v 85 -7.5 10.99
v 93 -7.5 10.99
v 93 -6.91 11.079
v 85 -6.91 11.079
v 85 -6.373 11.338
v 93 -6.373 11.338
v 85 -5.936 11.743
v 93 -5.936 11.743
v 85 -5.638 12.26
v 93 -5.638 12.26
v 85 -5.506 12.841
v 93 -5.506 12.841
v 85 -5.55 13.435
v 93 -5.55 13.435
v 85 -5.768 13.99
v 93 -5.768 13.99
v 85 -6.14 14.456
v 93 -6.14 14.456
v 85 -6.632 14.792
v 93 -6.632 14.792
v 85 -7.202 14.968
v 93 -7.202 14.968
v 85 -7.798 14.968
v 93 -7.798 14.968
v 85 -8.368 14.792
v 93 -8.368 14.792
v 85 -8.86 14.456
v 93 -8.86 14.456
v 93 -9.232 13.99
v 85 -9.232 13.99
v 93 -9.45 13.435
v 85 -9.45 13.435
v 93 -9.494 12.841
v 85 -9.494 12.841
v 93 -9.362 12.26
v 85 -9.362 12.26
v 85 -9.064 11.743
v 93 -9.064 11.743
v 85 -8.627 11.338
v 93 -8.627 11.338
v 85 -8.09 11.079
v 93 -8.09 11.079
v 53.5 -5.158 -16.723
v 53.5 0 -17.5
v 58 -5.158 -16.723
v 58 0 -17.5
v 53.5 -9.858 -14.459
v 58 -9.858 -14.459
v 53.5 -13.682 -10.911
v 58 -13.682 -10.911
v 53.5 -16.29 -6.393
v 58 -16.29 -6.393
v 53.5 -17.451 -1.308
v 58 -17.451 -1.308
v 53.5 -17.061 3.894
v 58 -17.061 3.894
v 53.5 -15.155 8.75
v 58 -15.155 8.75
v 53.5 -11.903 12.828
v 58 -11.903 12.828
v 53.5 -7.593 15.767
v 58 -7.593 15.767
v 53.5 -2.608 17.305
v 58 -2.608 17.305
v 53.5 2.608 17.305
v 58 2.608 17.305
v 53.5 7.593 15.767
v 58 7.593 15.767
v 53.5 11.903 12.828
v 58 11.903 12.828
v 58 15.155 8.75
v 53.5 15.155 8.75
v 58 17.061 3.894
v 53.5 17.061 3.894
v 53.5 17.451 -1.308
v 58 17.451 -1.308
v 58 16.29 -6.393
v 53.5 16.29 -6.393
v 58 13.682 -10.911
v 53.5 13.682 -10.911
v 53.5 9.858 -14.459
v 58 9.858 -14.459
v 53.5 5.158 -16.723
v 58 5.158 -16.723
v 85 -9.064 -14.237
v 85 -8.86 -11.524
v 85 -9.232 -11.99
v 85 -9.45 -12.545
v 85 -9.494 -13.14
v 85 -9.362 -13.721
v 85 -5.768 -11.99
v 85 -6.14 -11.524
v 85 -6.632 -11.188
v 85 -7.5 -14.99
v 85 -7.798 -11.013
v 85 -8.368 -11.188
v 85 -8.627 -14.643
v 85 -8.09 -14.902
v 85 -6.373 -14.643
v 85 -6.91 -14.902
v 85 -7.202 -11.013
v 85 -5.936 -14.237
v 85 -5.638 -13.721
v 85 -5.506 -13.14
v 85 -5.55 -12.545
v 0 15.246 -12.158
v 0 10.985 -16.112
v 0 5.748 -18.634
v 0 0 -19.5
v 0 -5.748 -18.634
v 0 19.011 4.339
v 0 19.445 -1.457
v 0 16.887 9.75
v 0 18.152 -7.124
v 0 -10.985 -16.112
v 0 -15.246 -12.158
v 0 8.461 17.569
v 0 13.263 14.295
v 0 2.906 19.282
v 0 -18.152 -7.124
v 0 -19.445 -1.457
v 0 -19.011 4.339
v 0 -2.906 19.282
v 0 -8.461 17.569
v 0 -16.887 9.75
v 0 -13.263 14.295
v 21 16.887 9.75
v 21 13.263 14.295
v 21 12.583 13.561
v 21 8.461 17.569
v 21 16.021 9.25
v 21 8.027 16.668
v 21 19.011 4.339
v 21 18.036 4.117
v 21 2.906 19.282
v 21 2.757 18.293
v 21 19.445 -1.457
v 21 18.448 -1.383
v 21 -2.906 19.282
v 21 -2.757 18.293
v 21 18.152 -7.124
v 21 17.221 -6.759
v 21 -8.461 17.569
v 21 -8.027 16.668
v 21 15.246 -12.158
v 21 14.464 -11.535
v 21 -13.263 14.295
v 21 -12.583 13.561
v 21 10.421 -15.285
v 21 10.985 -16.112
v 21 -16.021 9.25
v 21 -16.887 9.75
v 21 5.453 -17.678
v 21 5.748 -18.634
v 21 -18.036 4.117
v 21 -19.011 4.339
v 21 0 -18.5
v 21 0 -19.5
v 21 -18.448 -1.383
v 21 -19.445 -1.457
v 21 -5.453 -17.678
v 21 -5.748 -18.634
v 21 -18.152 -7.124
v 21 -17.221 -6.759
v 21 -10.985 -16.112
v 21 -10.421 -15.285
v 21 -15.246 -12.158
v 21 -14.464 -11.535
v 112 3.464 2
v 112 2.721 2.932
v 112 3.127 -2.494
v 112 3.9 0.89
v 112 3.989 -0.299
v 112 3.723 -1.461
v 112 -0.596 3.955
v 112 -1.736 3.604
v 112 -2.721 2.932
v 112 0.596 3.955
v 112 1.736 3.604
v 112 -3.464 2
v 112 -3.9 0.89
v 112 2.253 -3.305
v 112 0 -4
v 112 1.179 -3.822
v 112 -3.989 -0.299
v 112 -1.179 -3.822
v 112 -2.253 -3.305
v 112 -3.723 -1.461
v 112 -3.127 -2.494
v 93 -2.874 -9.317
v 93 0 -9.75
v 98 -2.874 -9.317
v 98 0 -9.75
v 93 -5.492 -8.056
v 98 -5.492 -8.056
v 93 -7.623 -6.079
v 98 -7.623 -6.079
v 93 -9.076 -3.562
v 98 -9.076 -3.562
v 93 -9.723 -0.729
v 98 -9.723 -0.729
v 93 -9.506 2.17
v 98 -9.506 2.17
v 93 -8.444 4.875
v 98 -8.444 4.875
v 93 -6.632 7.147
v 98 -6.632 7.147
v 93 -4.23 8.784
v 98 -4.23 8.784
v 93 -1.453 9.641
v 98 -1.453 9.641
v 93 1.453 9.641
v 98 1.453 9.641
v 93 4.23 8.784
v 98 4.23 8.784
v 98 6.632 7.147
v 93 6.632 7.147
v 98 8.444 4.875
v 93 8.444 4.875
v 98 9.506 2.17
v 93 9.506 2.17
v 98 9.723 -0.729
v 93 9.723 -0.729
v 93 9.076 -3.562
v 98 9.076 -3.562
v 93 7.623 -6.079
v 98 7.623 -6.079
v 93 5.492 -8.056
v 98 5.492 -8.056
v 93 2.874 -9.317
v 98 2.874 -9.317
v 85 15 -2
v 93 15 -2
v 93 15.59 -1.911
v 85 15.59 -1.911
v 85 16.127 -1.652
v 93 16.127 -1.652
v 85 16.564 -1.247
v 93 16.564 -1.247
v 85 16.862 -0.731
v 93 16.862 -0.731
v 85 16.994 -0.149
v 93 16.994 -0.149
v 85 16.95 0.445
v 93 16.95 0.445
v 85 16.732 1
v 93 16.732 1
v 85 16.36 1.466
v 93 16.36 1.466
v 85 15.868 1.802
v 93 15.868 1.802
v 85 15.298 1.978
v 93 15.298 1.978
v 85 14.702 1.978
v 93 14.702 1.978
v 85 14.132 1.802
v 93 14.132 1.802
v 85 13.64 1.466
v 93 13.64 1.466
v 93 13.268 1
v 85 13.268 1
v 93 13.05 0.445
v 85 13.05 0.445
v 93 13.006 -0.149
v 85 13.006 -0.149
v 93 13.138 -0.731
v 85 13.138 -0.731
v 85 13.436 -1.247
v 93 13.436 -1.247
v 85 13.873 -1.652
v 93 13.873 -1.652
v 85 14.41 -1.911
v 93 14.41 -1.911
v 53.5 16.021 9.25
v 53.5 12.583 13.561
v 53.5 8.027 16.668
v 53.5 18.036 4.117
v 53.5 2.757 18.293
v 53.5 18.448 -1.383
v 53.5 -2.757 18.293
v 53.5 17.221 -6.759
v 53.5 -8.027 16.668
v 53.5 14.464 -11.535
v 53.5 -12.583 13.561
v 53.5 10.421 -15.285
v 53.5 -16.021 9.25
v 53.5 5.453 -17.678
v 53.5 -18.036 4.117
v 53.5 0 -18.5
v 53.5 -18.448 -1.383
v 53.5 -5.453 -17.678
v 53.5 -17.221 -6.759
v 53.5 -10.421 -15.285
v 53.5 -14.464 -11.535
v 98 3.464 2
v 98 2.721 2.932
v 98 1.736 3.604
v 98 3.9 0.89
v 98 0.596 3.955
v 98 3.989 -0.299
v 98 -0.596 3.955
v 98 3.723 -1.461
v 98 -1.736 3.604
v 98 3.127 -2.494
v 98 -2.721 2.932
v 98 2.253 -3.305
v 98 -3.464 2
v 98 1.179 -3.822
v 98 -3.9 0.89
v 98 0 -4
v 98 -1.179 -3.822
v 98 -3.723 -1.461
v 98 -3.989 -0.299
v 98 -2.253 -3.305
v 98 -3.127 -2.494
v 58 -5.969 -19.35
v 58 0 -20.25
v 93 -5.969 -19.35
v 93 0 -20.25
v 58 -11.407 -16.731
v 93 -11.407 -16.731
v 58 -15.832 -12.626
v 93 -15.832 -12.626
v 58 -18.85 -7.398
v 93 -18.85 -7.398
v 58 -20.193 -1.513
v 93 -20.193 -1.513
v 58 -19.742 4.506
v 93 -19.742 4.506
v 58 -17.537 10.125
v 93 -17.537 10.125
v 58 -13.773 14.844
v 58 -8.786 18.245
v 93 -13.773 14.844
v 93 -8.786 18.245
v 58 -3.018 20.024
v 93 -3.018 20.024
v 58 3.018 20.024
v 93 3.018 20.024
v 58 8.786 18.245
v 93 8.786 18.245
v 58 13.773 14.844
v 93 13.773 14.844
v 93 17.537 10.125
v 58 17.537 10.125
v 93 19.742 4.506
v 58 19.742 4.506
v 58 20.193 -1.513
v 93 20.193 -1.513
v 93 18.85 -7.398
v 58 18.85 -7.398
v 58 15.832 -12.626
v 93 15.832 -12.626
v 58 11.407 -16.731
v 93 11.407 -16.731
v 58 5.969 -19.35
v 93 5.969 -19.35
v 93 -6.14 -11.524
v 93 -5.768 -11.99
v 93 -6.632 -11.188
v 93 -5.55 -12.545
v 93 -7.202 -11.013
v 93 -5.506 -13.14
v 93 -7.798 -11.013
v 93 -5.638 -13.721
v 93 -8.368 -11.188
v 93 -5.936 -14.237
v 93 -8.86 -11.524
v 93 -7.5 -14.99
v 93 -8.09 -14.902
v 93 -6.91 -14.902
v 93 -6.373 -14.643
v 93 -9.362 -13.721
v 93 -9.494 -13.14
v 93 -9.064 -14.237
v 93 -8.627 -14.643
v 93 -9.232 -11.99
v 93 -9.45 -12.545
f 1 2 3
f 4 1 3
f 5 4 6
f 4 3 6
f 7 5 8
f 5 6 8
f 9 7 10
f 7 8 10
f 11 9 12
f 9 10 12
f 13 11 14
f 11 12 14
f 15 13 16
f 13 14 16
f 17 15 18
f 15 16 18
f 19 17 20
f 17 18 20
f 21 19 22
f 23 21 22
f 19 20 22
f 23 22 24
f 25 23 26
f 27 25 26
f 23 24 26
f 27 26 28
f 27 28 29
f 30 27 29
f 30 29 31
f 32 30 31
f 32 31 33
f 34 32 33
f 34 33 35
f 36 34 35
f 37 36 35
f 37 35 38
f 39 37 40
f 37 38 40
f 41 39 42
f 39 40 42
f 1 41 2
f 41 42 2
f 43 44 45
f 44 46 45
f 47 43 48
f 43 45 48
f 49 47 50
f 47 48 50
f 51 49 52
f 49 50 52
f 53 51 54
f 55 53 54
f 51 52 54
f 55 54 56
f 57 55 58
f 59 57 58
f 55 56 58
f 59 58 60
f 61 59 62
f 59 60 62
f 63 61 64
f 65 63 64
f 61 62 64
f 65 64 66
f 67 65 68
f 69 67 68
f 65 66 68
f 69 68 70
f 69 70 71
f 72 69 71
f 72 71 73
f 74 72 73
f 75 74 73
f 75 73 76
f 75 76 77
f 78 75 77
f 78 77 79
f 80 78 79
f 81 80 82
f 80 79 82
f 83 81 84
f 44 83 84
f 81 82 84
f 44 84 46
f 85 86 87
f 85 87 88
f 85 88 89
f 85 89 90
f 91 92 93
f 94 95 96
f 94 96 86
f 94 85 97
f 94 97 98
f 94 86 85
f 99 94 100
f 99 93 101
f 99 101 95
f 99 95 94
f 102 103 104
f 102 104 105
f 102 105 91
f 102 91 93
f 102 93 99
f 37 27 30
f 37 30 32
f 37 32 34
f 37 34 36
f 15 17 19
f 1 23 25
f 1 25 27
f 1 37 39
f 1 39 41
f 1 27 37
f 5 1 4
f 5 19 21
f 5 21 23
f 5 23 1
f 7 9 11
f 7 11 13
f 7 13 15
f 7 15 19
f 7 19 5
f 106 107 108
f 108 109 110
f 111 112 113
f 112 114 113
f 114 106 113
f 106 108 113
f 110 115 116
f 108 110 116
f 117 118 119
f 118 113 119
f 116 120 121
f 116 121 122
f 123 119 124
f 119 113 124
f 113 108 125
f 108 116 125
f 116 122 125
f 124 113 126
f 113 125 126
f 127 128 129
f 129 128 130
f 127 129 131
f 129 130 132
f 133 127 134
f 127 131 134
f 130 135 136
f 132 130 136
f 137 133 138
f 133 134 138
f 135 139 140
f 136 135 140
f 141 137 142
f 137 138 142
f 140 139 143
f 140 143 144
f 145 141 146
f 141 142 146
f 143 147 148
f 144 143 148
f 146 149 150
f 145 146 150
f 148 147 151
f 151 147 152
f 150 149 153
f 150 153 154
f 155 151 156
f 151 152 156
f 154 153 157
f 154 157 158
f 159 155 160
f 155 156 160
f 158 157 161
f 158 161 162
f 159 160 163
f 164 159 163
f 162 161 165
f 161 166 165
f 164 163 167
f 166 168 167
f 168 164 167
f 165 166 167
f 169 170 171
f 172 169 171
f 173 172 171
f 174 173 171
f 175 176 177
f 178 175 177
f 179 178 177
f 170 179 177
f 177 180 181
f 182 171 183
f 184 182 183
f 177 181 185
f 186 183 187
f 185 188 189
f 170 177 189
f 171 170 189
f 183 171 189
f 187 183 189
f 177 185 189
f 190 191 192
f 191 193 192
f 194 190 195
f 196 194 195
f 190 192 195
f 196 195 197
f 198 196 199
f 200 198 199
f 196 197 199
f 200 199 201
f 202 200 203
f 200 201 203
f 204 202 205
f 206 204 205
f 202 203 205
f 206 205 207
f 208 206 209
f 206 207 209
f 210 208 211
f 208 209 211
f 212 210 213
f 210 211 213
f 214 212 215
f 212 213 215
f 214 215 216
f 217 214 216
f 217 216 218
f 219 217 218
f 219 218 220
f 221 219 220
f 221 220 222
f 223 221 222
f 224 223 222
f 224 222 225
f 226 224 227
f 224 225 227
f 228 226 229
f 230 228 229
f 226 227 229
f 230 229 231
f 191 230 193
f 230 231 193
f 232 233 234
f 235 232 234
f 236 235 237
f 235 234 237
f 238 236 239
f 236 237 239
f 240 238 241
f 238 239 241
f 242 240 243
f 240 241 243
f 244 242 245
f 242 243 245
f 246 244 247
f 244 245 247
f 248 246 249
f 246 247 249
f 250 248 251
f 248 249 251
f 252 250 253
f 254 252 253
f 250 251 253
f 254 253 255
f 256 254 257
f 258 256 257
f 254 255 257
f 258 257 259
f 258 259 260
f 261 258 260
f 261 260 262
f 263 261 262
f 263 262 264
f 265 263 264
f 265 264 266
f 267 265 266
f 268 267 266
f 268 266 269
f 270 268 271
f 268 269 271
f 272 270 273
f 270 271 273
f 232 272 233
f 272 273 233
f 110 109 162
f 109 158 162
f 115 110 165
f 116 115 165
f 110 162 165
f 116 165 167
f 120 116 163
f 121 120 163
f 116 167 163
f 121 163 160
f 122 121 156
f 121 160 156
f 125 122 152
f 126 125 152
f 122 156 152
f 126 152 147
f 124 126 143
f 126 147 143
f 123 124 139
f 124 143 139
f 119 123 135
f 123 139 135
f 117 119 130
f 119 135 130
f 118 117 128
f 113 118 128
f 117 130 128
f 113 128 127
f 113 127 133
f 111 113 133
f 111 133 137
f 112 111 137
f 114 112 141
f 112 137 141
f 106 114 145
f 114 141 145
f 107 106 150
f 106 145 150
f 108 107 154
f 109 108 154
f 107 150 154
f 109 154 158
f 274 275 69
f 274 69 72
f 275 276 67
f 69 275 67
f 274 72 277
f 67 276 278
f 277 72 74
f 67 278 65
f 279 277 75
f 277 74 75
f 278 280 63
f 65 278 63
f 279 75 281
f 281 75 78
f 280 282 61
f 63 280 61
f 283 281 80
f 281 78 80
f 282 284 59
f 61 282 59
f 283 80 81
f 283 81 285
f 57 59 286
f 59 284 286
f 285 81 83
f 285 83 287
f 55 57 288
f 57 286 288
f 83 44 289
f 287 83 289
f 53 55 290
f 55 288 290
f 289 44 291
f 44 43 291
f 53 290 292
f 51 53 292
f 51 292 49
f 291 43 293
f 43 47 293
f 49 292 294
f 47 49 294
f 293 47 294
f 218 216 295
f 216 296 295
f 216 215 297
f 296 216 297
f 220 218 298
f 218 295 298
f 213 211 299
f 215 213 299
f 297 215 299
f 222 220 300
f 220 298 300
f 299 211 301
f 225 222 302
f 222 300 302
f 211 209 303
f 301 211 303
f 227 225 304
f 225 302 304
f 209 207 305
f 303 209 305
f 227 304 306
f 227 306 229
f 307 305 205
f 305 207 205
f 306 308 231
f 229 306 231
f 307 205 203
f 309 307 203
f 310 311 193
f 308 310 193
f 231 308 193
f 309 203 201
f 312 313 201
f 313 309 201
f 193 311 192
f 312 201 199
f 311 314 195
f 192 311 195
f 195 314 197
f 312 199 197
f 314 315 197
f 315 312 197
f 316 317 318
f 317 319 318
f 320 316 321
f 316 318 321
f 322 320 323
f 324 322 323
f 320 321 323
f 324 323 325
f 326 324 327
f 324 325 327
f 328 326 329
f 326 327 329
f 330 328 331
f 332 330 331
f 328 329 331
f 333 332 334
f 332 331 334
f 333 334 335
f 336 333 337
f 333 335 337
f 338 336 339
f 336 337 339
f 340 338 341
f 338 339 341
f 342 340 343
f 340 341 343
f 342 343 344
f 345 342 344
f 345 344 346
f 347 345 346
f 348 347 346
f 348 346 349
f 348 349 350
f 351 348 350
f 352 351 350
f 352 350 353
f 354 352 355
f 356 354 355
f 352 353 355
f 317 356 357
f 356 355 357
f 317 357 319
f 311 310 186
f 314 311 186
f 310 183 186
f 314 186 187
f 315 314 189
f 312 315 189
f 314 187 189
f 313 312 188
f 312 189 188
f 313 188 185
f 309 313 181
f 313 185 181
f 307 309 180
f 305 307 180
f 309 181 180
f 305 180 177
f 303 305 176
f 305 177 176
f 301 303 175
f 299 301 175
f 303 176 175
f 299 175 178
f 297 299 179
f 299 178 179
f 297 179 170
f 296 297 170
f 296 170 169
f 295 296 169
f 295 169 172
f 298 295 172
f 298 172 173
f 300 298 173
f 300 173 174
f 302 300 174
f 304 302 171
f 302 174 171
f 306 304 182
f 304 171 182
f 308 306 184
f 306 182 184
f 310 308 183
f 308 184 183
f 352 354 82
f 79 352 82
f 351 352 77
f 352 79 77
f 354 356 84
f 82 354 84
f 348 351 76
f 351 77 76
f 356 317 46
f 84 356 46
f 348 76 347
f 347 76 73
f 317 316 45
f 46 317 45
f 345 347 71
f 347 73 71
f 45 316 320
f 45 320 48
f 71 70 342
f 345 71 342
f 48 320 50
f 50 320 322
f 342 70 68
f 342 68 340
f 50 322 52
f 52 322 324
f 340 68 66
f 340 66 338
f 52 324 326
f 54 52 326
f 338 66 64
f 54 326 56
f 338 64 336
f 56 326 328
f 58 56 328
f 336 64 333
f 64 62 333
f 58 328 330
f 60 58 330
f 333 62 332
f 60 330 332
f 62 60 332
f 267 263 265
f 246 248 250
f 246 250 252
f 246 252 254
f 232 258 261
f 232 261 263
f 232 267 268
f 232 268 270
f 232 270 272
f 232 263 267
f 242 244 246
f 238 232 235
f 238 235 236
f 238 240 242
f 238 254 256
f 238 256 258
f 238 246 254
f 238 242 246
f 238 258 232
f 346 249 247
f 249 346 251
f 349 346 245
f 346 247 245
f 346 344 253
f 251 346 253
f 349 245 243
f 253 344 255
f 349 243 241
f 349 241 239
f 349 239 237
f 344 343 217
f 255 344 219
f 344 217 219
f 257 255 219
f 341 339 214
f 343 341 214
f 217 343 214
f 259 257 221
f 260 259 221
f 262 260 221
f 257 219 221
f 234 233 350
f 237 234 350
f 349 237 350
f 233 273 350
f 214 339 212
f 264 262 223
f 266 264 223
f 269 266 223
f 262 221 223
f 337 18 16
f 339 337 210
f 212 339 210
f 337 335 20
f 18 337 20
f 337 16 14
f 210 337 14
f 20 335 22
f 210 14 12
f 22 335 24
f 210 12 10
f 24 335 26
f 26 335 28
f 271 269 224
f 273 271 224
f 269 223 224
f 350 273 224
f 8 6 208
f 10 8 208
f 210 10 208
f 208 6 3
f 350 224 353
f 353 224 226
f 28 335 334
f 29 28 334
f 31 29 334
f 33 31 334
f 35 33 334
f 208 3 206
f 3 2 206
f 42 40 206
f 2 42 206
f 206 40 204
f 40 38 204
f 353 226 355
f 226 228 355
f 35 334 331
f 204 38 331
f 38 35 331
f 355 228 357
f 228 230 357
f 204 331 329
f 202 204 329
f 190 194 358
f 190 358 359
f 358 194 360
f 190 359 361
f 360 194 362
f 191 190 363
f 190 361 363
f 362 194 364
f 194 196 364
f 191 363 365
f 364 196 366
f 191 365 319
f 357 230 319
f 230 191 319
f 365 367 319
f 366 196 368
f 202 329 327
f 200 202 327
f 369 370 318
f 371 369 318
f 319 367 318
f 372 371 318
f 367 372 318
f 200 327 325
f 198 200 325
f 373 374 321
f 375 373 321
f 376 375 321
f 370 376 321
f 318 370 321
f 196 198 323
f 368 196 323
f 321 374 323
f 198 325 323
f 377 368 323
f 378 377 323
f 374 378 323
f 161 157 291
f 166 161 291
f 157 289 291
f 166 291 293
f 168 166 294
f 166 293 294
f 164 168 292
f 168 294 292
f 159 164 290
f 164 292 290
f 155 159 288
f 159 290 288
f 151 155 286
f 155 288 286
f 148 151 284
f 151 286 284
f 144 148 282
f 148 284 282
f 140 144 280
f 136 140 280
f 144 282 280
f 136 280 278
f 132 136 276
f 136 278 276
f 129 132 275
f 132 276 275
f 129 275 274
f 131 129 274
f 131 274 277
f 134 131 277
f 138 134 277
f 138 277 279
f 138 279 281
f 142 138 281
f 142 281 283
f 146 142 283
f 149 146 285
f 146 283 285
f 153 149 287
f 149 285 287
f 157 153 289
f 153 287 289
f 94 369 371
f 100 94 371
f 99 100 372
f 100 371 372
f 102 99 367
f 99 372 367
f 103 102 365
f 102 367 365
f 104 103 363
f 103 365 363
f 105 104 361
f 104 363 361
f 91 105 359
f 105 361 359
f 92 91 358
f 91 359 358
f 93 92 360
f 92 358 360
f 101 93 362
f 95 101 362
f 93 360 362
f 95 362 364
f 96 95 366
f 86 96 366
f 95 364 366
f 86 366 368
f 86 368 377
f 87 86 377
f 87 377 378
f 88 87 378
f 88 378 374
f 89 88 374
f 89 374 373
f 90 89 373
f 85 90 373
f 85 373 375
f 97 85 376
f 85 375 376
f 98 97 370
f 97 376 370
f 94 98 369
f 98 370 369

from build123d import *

# Parameters (mm, degrees)
SCHIZZO4_R               = 2
TAGLIO_ESTRUSIONE1_DEPTH = 8


with BuildPart() as part:
    # Schizzo3 → Rivoluzione1 (revolve)
    with BuildSketch(Plane(origin=(0, 0, 0), x_dir=(1, 0, 0), z_dir=(0, 1, 0))):
        Polygon((0, 0), (0, 19.5), (21, 19.5), (21, 18.5), (53.5, 18.5), (53.5, 17.5), (58, 17.5), (58, 20.25), (93, 20.25), (93, 9.75), (98, 9.75), (98, 4), (112, 4), (112, 0), align=None)
    revolve(axis=Axis((112, 0, 0), (-1, 0, 0)))

    # Schizzo4 → Taglio-Estrusione1 (cut)
    with BuildSketch(Plane(origin=(93, 0, 0), x_dir=(0, 0, -1), z_dir=(1, 0, 0))):
        with Locations((0, 15)):
            Circle(SCHIZZO4_R)
        with Locations((12.990381057, -7.5)):
            Circle(SCHIZZO4_R)
        with Locations((-12.990381057, -7.5)):
            Circle(SCHIZZO4_R)
    extrude(amount=-TAGLIO_ESTRUSIONE1_DEPTH, mode=Mode.SUBTRACT)


solid = part.part
